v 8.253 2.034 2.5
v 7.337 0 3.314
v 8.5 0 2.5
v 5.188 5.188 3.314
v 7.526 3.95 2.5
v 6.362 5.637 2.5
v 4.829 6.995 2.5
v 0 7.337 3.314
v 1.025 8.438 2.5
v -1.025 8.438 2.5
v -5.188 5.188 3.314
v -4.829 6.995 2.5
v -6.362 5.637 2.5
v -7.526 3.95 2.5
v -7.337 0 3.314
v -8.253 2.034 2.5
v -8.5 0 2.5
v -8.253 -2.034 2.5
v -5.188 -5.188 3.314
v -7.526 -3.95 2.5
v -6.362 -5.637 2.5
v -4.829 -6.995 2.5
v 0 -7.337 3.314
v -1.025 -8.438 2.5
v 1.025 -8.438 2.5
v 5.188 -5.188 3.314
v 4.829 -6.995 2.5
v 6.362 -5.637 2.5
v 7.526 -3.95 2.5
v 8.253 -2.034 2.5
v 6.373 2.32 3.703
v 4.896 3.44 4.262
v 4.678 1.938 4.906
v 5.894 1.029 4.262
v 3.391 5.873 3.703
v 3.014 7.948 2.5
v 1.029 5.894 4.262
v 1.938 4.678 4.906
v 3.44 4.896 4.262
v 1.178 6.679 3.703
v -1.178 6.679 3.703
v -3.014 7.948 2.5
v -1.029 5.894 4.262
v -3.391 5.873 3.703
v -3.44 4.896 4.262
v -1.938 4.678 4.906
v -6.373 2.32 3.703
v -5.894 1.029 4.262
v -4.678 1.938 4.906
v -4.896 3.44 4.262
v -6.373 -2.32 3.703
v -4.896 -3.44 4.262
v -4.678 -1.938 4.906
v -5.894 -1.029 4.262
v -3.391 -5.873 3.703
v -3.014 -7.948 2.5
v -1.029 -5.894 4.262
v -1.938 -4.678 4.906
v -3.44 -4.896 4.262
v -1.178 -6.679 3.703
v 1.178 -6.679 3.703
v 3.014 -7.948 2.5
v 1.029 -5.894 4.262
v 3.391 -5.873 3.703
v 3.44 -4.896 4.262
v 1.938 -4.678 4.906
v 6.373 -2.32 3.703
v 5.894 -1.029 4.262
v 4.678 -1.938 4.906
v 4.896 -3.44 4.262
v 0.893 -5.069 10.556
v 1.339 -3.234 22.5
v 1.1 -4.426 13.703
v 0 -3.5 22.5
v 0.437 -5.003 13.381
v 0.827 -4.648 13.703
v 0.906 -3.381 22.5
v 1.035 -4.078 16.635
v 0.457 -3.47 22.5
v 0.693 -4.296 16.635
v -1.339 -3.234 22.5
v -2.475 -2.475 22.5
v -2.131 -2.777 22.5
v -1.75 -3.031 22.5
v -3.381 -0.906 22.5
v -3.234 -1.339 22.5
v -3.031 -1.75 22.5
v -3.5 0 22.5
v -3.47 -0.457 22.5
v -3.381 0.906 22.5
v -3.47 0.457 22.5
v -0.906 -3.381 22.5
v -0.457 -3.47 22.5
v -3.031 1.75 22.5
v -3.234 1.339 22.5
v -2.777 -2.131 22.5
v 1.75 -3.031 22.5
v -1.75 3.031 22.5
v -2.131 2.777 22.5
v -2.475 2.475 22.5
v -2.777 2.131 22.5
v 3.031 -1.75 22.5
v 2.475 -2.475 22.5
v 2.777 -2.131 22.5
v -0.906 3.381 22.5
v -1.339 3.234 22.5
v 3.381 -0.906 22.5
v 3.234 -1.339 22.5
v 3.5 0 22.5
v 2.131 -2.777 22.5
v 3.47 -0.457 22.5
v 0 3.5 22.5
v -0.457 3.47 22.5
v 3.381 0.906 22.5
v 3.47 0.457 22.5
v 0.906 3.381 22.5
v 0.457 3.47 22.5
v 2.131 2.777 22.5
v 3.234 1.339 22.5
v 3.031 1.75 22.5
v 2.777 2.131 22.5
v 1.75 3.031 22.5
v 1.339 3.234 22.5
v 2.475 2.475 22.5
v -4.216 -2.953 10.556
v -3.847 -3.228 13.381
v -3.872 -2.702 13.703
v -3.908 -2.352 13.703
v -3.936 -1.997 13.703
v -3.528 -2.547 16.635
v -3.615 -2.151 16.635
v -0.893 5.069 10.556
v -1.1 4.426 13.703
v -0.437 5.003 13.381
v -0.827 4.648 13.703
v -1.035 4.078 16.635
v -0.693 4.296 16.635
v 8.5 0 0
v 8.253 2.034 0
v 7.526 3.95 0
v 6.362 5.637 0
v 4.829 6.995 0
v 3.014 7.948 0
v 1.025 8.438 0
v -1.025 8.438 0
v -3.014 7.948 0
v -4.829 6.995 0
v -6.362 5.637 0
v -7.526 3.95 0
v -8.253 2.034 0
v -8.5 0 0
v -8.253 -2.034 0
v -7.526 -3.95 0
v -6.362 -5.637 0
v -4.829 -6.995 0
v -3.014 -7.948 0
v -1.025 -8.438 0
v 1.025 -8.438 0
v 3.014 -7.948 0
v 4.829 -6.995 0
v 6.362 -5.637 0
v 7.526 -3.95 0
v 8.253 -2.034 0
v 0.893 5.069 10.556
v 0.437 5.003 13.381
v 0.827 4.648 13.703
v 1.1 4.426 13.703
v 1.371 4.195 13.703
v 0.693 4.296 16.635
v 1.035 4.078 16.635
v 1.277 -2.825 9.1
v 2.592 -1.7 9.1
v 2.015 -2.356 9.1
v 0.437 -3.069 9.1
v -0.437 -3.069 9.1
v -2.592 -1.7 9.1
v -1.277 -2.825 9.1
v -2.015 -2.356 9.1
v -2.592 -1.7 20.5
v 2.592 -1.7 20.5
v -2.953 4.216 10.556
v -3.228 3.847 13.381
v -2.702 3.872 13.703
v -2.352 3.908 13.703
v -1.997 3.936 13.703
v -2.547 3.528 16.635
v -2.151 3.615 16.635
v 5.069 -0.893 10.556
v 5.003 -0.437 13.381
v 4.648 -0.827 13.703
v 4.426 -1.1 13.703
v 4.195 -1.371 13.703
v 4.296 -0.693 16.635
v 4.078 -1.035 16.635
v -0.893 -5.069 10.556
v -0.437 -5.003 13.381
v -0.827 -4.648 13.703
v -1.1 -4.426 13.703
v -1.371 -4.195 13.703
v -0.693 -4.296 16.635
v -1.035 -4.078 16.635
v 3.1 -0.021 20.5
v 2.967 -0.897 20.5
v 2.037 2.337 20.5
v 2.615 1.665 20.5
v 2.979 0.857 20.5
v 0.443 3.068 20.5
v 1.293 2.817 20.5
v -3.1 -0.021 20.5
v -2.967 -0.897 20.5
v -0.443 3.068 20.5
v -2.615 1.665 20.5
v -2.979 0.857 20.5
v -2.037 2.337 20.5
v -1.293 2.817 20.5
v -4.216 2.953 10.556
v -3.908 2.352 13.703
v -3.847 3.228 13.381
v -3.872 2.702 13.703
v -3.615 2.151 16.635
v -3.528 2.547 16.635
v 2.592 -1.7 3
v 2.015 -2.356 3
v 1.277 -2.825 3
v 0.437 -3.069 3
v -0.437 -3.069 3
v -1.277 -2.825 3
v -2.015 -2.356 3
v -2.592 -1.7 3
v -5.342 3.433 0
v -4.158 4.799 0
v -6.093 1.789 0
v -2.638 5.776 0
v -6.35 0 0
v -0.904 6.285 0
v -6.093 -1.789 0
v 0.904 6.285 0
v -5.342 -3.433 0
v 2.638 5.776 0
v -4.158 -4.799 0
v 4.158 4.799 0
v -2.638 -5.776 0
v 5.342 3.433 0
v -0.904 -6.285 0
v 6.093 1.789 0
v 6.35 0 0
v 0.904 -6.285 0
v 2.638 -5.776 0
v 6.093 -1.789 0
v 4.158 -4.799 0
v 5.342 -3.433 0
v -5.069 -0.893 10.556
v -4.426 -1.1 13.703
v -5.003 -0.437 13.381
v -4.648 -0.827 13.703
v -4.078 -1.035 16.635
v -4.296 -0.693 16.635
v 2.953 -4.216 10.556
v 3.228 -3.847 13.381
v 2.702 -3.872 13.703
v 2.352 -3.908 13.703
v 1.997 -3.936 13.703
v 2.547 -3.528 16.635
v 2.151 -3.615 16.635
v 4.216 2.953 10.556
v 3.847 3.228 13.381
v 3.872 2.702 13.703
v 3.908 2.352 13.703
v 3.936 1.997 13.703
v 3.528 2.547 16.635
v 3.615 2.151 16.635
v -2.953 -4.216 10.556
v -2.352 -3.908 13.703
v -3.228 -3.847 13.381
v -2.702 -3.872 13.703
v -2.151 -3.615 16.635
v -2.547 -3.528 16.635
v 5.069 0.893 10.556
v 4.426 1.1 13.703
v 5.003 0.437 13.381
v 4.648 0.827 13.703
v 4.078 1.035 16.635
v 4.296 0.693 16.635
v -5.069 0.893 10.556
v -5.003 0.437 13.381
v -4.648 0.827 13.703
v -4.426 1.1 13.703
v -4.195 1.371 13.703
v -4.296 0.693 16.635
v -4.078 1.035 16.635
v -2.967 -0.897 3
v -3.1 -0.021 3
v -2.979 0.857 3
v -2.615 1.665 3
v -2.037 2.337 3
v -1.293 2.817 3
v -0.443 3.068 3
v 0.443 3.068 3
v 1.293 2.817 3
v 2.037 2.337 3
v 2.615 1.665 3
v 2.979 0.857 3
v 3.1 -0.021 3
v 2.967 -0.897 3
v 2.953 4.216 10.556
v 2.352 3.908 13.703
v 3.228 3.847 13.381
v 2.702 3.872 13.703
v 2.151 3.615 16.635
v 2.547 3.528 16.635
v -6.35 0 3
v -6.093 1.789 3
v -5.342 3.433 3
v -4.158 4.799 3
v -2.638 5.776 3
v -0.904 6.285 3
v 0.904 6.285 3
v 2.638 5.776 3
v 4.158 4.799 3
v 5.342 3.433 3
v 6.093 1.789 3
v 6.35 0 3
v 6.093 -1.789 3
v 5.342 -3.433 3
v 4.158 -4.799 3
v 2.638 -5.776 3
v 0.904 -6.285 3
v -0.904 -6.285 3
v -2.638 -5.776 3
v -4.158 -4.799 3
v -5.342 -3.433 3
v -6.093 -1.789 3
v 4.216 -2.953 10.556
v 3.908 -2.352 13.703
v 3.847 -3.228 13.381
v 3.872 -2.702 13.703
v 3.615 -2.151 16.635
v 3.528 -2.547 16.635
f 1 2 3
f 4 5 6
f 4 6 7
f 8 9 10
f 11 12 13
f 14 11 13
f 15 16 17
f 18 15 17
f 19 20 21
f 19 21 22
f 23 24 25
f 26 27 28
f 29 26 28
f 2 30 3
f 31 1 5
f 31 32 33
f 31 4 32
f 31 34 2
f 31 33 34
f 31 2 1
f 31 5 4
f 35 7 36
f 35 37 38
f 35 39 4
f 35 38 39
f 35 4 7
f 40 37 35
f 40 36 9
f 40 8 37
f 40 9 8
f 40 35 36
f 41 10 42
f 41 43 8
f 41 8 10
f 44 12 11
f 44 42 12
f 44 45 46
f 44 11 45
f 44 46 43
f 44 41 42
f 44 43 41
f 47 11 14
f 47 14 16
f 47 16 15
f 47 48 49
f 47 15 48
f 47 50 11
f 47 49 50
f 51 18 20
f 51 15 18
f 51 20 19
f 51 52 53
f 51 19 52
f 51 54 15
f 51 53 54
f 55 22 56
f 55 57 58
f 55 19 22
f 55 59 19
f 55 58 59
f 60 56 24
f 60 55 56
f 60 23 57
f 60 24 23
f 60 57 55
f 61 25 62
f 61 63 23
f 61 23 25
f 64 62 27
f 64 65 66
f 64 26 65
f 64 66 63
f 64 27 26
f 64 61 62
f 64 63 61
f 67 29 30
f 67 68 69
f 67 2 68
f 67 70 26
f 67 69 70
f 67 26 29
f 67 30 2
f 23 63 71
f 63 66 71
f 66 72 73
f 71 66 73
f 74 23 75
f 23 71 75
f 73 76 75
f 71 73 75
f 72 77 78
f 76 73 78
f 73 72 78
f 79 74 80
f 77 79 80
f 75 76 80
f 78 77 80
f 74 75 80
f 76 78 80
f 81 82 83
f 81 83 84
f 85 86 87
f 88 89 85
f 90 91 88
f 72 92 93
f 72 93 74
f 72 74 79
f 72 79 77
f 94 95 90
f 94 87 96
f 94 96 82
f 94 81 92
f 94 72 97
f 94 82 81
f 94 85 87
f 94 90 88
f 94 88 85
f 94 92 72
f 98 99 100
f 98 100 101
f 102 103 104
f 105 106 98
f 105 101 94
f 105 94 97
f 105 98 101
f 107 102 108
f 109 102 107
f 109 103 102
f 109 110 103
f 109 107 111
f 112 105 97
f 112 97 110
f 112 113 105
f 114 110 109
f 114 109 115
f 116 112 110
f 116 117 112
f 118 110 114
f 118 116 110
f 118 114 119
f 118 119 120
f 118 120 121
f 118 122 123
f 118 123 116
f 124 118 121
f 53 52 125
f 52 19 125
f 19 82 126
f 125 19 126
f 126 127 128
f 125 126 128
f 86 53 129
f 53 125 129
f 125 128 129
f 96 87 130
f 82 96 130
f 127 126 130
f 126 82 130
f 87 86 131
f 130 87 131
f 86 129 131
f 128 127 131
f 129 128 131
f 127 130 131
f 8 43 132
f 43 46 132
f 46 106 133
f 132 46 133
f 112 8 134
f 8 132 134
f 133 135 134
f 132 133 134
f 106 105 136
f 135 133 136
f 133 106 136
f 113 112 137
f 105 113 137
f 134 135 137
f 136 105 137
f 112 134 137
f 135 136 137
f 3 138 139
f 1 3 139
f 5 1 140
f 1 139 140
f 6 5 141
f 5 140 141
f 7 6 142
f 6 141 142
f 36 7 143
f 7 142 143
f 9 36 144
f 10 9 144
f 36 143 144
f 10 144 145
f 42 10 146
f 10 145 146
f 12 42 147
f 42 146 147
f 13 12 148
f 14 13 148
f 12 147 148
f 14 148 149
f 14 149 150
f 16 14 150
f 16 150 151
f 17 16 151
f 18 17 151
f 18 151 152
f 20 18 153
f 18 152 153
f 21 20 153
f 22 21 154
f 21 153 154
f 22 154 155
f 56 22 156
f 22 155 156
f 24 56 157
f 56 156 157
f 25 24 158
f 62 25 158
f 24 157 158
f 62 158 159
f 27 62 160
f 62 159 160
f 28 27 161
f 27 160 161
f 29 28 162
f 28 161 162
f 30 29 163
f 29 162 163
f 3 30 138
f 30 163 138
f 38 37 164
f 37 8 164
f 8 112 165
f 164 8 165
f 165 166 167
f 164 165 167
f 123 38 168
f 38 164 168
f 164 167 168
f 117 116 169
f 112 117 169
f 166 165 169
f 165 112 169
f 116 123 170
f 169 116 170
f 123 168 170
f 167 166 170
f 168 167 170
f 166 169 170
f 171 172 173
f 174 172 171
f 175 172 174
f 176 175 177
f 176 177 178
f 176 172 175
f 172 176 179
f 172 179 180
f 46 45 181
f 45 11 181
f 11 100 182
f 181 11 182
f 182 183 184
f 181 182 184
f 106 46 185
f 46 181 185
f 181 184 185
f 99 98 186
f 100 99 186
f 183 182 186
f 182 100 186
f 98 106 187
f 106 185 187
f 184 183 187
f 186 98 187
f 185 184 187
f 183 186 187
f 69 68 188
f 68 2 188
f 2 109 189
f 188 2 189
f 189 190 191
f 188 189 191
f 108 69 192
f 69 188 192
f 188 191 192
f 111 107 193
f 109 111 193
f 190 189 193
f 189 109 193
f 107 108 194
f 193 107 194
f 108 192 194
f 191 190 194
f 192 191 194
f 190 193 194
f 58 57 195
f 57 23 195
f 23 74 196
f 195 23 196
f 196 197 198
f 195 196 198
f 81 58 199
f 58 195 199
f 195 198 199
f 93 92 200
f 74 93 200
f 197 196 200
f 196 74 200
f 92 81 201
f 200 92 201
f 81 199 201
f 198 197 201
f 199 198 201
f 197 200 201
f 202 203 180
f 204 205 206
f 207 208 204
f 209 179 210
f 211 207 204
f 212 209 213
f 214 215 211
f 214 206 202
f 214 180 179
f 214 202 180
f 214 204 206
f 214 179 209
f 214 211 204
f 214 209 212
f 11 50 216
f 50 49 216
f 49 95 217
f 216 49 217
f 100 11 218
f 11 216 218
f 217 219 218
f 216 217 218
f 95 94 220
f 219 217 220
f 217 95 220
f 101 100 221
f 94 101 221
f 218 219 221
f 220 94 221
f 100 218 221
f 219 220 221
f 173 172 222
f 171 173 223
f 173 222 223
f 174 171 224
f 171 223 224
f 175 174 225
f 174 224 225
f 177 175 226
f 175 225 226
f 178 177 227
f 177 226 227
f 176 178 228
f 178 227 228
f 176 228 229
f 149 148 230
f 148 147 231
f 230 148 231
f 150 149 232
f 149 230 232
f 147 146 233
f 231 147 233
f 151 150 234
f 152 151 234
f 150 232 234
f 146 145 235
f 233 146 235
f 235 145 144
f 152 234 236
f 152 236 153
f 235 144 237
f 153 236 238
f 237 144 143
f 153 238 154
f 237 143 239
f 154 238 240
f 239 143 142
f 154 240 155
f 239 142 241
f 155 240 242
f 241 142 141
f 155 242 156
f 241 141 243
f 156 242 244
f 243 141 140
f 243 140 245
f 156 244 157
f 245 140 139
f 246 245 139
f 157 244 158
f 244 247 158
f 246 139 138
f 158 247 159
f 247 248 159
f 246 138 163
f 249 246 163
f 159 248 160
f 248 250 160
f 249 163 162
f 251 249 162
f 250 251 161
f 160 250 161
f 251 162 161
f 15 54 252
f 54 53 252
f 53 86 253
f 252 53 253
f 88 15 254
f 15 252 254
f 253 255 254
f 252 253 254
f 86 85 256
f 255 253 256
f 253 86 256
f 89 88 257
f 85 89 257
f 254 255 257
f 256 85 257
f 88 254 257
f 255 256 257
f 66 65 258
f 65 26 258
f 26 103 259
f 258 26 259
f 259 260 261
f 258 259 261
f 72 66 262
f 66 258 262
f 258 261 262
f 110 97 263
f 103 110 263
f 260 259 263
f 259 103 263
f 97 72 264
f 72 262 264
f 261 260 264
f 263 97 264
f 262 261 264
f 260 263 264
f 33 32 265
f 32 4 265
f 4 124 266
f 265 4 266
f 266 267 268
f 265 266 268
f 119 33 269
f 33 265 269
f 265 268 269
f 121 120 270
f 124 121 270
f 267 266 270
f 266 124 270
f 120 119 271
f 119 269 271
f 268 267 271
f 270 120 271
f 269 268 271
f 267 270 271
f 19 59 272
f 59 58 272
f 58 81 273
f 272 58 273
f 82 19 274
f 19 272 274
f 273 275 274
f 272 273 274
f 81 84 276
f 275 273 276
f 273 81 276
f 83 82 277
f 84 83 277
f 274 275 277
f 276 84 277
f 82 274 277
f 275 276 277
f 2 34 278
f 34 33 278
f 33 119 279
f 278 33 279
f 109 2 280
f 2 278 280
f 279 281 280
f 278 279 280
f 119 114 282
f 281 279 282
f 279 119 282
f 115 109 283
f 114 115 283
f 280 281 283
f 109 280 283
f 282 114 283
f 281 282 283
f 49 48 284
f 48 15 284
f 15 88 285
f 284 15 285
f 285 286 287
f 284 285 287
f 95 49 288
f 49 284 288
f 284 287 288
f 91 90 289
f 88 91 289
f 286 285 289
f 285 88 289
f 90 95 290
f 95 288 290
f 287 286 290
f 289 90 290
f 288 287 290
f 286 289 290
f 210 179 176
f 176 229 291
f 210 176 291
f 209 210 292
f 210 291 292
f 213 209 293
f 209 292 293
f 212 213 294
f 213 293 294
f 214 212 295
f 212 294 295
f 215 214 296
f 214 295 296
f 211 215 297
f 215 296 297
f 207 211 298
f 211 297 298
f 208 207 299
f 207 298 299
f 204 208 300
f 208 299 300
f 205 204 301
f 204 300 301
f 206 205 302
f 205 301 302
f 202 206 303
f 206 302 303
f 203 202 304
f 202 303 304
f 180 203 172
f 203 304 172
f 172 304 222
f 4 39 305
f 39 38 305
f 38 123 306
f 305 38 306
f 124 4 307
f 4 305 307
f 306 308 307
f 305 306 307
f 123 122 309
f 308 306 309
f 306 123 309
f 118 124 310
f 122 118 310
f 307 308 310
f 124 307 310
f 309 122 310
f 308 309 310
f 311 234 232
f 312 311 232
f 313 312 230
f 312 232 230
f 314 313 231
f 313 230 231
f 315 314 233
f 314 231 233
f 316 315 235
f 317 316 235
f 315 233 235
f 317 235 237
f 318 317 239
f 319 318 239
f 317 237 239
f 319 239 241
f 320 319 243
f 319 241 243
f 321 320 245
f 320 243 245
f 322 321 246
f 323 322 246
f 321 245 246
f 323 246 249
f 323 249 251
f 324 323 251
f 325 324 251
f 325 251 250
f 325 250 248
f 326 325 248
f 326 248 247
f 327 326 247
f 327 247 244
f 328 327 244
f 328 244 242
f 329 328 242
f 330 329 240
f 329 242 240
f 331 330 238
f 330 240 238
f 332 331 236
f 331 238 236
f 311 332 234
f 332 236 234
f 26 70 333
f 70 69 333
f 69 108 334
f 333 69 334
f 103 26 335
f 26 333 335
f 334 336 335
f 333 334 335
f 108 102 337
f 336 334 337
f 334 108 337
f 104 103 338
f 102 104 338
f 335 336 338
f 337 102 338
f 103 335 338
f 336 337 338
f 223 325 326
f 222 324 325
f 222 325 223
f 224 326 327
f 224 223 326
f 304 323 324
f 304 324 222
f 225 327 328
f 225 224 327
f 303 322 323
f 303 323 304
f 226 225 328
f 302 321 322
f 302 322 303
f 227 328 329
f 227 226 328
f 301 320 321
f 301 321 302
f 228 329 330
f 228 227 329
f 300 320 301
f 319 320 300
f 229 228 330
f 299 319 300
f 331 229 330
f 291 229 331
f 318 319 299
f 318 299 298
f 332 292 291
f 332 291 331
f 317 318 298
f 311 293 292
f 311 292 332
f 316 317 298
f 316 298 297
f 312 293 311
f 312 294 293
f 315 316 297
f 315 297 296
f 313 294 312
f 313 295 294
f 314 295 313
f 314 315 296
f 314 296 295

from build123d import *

# Parameters (mm, degrees)
SKETCH_R        = 8.5
PAD001_DEPTH    = 6
CHAMFER_ANGLE   = 55
CHAMFER_SIZE    = 3.5
SKETCH007_R     = 3.5
POCKET_DEPTH    = 20.5
SKETCH5_R       = 6.35
POCKET001_DEPTH = 3
SKETCH6_R       = 3.1
POCKET002_DEPTH = 6.1


with BuildPart() as part:
    # Sketch → Pad001 (new body)
    with BuildSketch(Plane.XY):
        Circle(SKETCH_R)
    extrude(amount=PAD001_DEPTH)

    # Chamfer
    chamfer_edges = [part.edges().sort_by_distance(p)[0] for p in [
        (-8.5, 0, 6),
    ]]
    chamfer_side = part.faces().sort_by_distance((-8.5, 0, 3))[0]
    chamfer(chamfer_edges, length=CHAMFER_SIZE, angle=CHAMFER_ANGLE, reference=chamfer_side)

    # Sketch1 → AdditiveLoft section 0
    with BuildSketch(Plane.XY):
        Polygon((-2.104759, 5.081337), (0, 8), (2.104759, 5.081337), (5.656854, 5.656854), (5.081337, 2.104759), (8, 0), (5.081337, -2.104759), (5.656854, -5.656854), (2.104759, -5.081337), (0, -8), (-2.104759, -5.081337), (-5.656854, -5.656854), (-5.081337, -2.104759), (-8, 0), (-5.081337, 2.104759), (-5.656854, 5.656854), align=None)
    # Sketch007 → AdditiveLoft section 1
    with BuildSketch(Plane.XY.offset(22.5)):
        Circle(SKETCH007_R)
    loft()

    # Sketch3 → Pocket (cut)
    with BuildSketch(Plane(origin=(0, 0, 0), x_dir=(-1, 0, 0), z_dir=(0, 0, -1))):
        with BuildLine():
            ThreePointArc((2.592296, -1.7), (0, 3.1), (-2.592296, -1.7))
            Line((2.592296, -1.7), (-2.592296, -1.7))
        make_face()
    extrude(amount=-POCKET_DEPTH, mode=Mode.SUBTRACT)

    # Sketch5 → Pocket001 (cut)
    with BuildSketch(Plane(origin=(0, 0, 0), x_dir=(-1, 0, 0), z_dir=(0, 0, -1))):
        Circle(SKETCH5_R)
    extrude(amount=-POCKET001_DEPTH, mode=Mode.SUBTRACT)

    # Sketch6 → Pocket002 (cut)
    with BuildSketch(Plane(origin=(0, 0, 3), x_dir=(-1, 0, 0), z_dir=(0, 0, -1))):
        Circle(SKETCH6_R)
    extrude(amount=-POCKET002_DEPTH, mode=Mode.SUBTRACT)


solid = part.part
